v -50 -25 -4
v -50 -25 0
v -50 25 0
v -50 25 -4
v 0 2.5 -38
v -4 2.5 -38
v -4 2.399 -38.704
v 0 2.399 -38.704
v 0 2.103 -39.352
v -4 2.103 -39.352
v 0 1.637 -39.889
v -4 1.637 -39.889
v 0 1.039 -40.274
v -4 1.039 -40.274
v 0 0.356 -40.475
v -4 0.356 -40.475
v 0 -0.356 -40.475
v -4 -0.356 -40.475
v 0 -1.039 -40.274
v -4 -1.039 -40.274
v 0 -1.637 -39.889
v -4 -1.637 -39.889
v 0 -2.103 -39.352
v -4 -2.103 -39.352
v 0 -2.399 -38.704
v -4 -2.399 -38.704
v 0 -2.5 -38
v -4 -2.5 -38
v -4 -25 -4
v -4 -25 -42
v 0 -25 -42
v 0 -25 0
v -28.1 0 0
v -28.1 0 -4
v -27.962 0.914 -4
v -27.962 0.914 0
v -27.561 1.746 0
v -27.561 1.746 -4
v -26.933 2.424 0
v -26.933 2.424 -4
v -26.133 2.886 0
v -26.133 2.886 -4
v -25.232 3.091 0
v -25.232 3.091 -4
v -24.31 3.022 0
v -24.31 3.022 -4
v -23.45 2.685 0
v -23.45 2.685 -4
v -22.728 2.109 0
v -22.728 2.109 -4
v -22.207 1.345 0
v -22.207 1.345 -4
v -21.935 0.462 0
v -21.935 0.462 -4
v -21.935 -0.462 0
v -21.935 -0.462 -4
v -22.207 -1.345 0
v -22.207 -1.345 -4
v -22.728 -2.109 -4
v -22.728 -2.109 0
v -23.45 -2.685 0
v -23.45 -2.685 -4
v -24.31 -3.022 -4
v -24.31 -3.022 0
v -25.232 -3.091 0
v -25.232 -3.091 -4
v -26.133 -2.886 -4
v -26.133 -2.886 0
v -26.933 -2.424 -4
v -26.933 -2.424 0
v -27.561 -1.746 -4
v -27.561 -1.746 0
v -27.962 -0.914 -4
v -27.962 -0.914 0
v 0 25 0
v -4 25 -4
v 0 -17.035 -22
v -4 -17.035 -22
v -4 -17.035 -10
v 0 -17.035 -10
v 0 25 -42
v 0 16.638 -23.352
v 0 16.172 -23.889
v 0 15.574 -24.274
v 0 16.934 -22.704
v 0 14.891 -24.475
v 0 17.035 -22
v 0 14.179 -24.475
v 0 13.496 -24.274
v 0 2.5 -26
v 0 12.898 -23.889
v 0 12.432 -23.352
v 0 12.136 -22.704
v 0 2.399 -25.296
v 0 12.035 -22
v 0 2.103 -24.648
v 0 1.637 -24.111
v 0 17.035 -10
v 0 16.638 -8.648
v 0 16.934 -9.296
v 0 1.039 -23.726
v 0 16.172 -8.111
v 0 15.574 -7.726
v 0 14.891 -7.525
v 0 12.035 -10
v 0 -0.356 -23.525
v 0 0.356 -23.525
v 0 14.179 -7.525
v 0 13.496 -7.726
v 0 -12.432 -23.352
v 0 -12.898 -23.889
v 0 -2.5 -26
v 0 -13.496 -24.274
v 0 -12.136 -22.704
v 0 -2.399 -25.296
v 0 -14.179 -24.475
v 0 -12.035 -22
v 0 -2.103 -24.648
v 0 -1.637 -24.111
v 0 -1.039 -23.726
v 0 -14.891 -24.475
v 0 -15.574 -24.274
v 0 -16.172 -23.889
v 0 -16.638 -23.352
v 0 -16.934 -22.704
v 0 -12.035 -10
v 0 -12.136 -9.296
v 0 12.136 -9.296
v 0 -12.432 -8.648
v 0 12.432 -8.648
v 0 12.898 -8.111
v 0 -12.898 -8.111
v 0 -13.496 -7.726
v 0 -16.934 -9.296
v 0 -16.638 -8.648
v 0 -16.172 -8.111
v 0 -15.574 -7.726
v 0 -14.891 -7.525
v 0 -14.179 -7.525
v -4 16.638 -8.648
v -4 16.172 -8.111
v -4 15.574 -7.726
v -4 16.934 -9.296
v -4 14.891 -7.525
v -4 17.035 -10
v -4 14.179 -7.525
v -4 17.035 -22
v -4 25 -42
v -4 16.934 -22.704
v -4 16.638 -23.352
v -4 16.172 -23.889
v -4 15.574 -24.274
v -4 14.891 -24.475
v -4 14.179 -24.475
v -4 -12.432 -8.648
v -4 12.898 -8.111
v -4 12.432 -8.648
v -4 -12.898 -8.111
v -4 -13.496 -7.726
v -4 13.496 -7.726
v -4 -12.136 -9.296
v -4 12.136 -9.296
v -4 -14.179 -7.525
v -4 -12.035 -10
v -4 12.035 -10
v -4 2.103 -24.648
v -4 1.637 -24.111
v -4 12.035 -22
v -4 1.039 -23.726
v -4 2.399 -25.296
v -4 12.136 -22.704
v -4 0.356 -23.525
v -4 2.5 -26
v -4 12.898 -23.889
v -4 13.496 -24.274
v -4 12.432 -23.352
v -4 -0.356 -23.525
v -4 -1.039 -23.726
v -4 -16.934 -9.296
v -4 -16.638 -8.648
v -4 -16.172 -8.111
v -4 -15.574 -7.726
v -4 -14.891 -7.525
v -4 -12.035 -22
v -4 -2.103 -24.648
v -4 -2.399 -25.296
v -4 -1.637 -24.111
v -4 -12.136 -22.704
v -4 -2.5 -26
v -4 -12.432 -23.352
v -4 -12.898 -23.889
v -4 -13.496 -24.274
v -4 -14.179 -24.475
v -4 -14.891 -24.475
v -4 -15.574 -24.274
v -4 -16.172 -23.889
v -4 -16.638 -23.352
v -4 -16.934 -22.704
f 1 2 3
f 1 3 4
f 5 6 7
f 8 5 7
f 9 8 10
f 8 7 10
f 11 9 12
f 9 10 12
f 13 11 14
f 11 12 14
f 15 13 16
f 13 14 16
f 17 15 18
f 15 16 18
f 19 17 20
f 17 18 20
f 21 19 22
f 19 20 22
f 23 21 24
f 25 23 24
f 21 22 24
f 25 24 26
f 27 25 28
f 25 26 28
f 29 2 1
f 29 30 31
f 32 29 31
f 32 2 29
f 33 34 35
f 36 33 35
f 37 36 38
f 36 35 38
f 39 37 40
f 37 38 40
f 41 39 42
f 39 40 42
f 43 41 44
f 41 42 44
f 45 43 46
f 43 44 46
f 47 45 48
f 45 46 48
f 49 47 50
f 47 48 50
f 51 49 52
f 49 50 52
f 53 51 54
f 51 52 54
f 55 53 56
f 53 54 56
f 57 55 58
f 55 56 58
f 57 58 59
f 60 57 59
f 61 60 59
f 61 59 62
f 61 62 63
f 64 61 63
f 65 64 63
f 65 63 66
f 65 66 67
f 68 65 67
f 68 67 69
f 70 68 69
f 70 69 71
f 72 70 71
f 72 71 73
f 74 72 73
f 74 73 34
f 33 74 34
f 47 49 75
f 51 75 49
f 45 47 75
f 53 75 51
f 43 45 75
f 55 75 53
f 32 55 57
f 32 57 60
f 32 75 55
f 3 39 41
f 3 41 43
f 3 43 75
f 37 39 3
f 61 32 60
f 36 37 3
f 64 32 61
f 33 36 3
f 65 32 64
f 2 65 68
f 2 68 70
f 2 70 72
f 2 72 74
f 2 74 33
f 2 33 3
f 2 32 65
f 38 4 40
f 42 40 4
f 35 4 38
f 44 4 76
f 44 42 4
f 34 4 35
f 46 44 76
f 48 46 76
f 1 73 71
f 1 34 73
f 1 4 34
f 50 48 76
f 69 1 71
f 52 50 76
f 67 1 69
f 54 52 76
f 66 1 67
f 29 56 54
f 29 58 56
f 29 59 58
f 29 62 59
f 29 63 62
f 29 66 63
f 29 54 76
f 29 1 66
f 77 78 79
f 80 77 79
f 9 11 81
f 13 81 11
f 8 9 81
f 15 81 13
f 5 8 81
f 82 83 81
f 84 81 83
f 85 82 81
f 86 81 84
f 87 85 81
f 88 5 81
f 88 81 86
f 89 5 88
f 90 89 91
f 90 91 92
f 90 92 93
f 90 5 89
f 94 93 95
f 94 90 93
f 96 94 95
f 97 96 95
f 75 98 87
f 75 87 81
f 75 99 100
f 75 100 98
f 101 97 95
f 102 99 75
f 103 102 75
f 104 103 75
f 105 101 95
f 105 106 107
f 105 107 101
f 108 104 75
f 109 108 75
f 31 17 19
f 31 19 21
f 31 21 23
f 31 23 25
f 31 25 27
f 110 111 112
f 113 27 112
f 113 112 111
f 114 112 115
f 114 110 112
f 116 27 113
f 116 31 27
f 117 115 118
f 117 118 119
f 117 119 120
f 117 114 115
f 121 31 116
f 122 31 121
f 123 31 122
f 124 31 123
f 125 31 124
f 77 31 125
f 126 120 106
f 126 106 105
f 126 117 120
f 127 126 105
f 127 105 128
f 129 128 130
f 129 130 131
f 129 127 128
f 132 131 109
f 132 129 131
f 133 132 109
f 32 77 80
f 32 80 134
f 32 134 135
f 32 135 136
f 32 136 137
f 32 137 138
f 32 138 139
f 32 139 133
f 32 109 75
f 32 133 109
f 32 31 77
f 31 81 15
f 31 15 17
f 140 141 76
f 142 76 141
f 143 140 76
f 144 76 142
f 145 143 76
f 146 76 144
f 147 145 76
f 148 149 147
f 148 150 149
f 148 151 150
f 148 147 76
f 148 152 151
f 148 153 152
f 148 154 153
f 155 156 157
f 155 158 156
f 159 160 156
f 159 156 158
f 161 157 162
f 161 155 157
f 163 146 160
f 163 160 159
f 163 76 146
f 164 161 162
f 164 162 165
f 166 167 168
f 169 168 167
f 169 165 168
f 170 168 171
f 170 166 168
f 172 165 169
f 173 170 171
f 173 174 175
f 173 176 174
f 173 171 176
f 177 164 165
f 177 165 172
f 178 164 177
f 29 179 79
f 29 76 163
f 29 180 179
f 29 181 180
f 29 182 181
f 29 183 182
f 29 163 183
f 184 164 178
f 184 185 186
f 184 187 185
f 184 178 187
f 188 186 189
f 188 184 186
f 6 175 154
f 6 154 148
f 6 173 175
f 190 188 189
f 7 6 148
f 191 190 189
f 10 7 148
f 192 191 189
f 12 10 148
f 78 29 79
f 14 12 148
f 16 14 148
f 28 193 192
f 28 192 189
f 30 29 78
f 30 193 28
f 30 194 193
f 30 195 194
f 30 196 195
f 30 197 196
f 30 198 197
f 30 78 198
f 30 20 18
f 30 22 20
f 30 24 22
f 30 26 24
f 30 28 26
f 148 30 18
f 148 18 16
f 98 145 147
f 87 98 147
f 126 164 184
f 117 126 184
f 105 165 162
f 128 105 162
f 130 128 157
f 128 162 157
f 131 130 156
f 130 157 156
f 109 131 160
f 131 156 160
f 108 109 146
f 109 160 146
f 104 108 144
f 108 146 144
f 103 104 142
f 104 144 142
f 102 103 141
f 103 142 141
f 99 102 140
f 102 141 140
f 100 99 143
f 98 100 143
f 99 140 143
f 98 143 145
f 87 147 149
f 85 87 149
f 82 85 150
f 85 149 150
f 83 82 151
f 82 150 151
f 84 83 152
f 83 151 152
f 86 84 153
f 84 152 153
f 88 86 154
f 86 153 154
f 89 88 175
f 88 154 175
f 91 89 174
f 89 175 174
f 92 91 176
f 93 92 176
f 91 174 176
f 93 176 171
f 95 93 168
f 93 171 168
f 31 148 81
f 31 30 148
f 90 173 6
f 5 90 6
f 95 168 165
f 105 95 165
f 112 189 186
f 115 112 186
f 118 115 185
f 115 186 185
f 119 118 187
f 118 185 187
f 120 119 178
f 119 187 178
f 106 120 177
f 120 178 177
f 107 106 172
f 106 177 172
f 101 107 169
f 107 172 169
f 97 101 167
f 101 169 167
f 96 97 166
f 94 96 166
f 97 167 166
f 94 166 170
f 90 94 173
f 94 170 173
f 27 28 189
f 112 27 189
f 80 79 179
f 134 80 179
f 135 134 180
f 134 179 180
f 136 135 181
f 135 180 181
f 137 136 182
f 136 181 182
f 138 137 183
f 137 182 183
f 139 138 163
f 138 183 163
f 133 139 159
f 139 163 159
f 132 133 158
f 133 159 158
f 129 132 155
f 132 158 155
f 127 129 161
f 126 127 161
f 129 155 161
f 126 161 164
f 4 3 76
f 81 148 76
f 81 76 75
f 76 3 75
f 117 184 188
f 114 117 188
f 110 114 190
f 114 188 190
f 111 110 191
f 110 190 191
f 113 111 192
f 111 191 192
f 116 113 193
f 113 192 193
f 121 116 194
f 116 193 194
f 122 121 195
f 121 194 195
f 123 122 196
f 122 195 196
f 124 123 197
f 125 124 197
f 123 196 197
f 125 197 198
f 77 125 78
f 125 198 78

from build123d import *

# Parameters (mm, degrees)
F1_DEPTH = 25
F3_D     = 6.2
F5_DEPTH = 4.001


with BuildPart() as f1:
    # F0 (on Front) → F1 (new body, symmetric)
    with BuildSketch(Plane.XZ):
        Polygon((0, -42), (0, 0), (-50, 0), (-50, -4), (-4, -4), (-4, -42), align=None)
    extrude(amount=F1_DEPTH, both=True)

    # F3 (through all)
    with Locations(Plane.XY):
        with Locations((-25, 0)):
            Hole(F3_D / 2)

    # F4 (on face) → F5 (cut, through all)
    with BuildSketch(Plane(origin=(-4, 0, 0), x_dir=(0, -1, 0), z_dir=(-1, 0, 0))):
        with BuildLine():
            ThreePointArc((-17.034974, -22), (-14.534974, -24.5), (-12.034974, -22))
            Line((-12.034974, -22), (-12.034974, -10))
            ThreePointArc((-12.034974, -10), (-14.534974, -7.5), (-17.034974, -10))
            Line((-17.034974, -10), (-17.034974, -22))
        make_face()
        with BuildLine():
            ThreePointArc((-2.5, -38), (0, -40.5), (2.5, -38))
            Line((2.5, -38), (2.5, -26))
            ThreePointArc((2.5, -26), (0, -23.5), (-2.5, -26))
            Line((-2.5, -26), (-2.5, -38))
        make_face()
        with BuildLine():
            ThreePointArc((12.034974, -22), (14.534974, -24.5), (17.034974, -22))
            Line((17.034974, -22), (17.034974, -10))
            ThreePointArc((17.034974, -10), (14.534974, -7.5), (12.034974, -10))
            Line((12.034974, -10), (12.034974, -22))
        make_face()
    extrude(amount=-F5_DEPTH, mode=Mode.SUBTRACT)


solid = f1.part
